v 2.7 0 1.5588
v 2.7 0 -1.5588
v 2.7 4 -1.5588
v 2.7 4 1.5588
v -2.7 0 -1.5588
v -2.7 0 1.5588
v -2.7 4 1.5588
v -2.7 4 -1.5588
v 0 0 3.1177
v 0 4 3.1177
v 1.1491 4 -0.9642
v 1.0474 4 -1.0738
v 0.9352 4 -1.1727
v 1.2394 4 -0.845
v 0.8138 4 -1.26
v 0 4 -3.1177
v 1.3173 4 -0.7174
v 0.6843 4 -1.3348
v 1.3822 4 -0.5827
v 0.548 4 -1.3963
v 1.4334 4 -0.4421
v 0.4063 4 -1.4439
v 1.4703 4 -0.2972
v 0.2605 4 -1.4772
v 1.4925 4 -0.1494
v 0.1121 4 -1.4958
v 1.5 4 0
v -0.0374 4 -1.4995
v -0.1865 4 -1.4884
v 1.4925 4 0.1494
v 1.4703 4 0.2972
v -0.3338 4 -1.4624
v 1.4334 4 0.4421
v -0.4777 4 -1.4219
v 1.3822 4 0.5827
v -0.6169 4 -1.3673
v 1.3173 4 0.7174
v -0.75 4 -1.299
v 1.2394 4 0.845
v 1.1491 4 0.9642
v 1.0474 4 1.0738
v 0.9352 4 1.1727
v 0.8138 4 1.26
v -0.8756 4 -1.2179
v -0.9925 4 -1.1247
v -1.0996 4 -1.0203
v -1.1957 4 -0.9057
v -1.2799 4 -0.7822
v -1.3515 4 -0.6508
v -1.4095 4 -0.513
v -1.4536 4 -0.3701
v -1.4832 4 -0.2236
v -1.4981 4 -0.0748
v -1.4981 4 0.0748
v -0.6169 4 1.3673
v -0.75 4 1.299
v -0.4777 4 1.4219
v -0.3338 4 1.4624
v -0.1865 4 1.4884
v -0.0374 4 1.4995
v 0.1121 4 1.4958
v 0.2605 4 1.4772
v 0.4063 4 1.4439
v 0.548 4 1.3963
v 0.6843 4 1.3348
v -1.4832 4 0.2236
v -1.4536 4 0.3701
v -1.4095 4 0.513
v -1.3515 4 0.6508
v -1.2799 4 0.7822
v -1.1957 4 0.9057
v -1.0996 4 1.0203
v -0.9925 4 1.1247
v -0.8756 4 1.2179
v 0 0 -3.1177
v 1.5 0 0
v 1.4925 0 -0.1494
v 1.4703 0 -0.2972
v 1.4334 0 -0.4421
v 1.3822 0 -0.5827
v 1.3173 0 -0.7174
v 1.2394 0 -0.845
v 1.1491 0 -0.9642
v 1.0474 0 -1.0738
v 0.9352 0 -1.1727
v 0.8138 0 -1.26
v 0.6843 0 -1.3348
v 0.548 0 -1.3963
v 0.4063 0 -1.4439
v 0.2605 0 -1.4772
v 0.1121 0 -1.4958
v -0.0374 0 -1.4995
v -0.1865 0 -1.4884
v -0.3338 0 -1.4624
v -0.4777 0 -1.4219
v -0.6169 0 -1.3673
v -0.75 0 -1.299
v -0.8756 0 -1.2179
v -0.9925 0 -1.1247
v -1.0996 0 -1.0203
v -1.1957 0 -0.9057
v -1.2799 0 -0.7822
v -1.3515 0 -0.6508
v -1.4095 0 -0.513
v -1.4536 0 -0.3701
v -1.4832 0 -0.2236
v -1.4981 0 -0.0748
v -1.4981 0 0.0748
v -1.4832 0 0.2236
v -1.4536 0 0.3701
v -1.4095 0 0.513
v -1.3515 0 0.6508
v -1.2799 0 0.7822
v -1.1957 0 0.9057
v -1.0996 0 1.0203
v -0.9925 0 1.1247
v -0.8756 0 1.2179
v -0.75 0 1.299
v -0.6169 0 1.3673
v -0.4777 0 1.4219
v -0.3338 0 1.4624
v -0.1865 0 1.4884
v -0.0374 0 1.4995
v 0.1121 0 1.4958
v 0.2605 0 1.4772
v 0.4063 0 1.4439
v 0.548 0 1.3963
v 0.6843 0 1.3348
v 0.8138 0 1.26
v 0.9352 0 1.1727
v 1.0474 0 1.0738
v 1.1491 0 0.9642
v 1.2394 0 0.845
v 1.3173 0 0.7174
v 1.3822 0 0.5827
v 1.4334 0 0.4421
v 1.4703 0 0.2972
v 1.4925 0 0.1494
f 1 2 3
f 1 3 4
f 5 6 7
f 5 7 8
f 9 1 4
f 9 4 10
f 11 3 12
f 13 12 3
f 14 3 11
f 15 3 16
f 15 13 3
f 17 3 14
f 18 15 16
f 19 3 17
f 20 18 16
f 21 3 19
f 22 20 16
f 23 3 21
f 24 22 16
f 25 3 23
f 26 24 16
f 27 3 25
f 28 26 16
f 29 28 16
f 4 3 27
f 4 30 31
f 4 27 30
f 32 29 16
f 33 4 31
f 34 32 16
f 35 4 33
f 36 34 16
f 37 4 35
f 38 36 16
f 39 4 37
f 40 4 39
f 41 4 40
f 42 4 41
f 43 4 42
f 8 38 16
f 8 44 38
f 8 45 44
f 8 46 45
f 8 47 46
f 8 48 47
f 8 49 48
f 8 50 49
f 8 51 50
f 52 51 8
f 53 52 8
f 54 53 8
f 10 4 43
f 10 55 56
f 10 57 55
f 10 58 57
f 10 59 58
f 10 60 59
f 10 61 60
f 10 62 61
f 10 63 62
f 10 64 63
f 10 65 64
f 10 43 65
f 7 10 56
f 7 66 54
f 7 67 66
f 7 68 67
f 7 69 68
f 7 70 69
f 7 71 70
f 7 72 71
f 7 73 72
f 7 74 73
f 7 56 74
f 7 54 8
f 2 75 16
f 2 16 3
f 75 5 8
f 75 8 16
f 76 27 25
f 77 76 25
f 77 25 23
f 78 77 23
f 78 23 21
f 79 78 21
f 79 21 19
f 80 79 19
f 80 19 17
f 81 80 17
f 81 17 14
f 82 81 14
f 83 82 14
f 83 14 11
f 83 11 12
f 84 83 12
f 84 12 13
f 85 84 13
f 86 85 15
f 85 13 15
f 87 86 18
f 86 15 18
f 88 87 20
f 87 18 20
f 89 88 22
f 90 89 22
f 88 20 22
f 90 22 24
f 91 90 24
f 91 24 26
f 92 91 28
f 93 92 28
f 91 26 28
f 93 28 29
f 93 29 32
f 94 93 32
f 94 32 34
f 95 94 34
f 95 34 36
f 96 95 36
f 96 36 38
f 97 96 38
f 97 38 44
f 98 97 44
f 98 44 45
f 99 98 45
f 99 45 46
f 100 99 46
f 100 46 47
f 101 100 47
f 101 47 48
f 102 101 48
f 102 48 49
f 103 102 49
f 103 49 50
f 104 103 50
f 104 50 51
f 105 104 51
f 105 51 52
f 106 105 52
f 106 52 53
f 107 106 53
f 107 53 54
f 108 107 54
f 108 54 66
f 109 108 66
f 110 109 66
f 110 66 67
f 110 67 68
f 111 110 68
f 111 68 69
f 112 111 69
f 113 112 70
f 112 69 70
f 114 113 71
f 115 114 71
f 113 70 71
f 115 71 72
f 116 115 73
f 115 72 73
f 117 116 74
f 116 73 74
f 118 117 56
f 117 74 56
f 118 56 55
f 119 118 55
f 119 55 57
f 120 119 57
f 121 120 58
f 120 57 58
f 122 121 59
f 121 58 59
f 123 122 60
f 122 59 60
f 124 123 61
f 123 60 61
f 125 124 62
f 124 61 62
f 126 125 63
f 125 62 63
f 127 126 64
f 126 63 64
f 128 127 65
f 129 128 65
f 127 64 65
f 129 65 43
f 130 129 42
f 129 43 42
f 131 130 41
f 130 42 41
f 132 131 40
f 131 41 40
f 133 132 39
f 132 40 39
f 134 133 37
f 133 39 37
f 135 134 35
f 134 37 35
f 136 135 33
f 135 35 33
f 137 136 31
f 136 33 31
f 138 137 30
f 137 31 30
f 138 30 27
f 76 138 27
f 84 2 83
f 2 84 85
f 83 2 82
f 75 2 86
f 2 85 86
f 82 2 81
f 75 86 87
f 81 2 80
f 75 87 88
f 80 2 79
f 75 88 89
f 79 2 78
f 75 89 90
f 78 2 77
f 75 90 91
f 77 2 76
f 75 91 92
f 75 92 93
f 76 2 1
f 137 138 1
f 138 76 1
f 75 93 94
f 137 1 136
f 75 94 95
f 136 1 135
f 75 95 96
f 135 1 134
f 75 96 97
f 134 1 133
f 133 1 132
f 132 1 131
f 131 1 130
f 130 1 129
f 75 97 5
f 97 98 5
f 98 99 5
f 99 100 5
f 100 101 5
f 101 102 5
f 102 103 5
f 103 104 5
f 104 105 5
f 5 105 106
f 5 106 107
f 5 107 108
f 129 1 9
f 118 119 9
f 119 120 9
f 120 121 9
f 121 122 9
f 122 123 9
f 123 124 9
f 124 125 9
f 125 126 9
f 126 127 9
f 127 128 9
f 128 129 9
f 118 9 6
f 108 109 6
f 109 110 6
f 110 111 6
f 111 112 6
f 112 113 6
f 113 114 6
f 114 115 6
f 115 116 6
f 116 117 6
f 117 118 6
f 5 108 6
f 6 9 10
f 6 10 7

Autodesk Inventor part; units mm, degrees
ref_plane "YZ Plane" through (0, 0, 0) normal (1, 0, 0) x (0, 1, 0)
ref_plane "XZ Plane" through (0, 0, 0) normal (0, 1, 0) x (-1, 0, 0)
ref_plane "XY Plane" through (0, 0, 0) normal (0, 0, 1) x (1, 0, 0)
sketch "Sketch1" plane through (0, 0, 0) normal (0, 1, 0) x (-1, 0, 0)
  line L0 (0, -3.1177) -> (-2.7, -1.5588)
  line L1 (-2.7, -1.5588) -> (-2.7, 1.5588)
  line L2 (-2.7, 1.5588) -> (0, 3.1177)
  line L3 (0, 3.1177) -> (2.7, 1.5588)
  line L4 (2.7, 1.5588) -> (2.7, -1.5588)
  line L5 (2.7, -1.5588) -> (0, -3.1177)
  point P0 (0, 0)
  point P1 (0, 0)
  dimension "d0" = 5.4
extrude "Extrusion1" add sketch "Sketch1" along normal blind 4
sketch "Sketch2" plane through (0, 4, 0) normal (0, 1, 0) x (1, 0, 0)
  circle A0 centre (0, 0) radius 1.5
  dimension "d3" = 3
extrude "Extrusion2" cut sketch "Sketch2" against normal blind 4
properties part number "M3_lock_nut"
